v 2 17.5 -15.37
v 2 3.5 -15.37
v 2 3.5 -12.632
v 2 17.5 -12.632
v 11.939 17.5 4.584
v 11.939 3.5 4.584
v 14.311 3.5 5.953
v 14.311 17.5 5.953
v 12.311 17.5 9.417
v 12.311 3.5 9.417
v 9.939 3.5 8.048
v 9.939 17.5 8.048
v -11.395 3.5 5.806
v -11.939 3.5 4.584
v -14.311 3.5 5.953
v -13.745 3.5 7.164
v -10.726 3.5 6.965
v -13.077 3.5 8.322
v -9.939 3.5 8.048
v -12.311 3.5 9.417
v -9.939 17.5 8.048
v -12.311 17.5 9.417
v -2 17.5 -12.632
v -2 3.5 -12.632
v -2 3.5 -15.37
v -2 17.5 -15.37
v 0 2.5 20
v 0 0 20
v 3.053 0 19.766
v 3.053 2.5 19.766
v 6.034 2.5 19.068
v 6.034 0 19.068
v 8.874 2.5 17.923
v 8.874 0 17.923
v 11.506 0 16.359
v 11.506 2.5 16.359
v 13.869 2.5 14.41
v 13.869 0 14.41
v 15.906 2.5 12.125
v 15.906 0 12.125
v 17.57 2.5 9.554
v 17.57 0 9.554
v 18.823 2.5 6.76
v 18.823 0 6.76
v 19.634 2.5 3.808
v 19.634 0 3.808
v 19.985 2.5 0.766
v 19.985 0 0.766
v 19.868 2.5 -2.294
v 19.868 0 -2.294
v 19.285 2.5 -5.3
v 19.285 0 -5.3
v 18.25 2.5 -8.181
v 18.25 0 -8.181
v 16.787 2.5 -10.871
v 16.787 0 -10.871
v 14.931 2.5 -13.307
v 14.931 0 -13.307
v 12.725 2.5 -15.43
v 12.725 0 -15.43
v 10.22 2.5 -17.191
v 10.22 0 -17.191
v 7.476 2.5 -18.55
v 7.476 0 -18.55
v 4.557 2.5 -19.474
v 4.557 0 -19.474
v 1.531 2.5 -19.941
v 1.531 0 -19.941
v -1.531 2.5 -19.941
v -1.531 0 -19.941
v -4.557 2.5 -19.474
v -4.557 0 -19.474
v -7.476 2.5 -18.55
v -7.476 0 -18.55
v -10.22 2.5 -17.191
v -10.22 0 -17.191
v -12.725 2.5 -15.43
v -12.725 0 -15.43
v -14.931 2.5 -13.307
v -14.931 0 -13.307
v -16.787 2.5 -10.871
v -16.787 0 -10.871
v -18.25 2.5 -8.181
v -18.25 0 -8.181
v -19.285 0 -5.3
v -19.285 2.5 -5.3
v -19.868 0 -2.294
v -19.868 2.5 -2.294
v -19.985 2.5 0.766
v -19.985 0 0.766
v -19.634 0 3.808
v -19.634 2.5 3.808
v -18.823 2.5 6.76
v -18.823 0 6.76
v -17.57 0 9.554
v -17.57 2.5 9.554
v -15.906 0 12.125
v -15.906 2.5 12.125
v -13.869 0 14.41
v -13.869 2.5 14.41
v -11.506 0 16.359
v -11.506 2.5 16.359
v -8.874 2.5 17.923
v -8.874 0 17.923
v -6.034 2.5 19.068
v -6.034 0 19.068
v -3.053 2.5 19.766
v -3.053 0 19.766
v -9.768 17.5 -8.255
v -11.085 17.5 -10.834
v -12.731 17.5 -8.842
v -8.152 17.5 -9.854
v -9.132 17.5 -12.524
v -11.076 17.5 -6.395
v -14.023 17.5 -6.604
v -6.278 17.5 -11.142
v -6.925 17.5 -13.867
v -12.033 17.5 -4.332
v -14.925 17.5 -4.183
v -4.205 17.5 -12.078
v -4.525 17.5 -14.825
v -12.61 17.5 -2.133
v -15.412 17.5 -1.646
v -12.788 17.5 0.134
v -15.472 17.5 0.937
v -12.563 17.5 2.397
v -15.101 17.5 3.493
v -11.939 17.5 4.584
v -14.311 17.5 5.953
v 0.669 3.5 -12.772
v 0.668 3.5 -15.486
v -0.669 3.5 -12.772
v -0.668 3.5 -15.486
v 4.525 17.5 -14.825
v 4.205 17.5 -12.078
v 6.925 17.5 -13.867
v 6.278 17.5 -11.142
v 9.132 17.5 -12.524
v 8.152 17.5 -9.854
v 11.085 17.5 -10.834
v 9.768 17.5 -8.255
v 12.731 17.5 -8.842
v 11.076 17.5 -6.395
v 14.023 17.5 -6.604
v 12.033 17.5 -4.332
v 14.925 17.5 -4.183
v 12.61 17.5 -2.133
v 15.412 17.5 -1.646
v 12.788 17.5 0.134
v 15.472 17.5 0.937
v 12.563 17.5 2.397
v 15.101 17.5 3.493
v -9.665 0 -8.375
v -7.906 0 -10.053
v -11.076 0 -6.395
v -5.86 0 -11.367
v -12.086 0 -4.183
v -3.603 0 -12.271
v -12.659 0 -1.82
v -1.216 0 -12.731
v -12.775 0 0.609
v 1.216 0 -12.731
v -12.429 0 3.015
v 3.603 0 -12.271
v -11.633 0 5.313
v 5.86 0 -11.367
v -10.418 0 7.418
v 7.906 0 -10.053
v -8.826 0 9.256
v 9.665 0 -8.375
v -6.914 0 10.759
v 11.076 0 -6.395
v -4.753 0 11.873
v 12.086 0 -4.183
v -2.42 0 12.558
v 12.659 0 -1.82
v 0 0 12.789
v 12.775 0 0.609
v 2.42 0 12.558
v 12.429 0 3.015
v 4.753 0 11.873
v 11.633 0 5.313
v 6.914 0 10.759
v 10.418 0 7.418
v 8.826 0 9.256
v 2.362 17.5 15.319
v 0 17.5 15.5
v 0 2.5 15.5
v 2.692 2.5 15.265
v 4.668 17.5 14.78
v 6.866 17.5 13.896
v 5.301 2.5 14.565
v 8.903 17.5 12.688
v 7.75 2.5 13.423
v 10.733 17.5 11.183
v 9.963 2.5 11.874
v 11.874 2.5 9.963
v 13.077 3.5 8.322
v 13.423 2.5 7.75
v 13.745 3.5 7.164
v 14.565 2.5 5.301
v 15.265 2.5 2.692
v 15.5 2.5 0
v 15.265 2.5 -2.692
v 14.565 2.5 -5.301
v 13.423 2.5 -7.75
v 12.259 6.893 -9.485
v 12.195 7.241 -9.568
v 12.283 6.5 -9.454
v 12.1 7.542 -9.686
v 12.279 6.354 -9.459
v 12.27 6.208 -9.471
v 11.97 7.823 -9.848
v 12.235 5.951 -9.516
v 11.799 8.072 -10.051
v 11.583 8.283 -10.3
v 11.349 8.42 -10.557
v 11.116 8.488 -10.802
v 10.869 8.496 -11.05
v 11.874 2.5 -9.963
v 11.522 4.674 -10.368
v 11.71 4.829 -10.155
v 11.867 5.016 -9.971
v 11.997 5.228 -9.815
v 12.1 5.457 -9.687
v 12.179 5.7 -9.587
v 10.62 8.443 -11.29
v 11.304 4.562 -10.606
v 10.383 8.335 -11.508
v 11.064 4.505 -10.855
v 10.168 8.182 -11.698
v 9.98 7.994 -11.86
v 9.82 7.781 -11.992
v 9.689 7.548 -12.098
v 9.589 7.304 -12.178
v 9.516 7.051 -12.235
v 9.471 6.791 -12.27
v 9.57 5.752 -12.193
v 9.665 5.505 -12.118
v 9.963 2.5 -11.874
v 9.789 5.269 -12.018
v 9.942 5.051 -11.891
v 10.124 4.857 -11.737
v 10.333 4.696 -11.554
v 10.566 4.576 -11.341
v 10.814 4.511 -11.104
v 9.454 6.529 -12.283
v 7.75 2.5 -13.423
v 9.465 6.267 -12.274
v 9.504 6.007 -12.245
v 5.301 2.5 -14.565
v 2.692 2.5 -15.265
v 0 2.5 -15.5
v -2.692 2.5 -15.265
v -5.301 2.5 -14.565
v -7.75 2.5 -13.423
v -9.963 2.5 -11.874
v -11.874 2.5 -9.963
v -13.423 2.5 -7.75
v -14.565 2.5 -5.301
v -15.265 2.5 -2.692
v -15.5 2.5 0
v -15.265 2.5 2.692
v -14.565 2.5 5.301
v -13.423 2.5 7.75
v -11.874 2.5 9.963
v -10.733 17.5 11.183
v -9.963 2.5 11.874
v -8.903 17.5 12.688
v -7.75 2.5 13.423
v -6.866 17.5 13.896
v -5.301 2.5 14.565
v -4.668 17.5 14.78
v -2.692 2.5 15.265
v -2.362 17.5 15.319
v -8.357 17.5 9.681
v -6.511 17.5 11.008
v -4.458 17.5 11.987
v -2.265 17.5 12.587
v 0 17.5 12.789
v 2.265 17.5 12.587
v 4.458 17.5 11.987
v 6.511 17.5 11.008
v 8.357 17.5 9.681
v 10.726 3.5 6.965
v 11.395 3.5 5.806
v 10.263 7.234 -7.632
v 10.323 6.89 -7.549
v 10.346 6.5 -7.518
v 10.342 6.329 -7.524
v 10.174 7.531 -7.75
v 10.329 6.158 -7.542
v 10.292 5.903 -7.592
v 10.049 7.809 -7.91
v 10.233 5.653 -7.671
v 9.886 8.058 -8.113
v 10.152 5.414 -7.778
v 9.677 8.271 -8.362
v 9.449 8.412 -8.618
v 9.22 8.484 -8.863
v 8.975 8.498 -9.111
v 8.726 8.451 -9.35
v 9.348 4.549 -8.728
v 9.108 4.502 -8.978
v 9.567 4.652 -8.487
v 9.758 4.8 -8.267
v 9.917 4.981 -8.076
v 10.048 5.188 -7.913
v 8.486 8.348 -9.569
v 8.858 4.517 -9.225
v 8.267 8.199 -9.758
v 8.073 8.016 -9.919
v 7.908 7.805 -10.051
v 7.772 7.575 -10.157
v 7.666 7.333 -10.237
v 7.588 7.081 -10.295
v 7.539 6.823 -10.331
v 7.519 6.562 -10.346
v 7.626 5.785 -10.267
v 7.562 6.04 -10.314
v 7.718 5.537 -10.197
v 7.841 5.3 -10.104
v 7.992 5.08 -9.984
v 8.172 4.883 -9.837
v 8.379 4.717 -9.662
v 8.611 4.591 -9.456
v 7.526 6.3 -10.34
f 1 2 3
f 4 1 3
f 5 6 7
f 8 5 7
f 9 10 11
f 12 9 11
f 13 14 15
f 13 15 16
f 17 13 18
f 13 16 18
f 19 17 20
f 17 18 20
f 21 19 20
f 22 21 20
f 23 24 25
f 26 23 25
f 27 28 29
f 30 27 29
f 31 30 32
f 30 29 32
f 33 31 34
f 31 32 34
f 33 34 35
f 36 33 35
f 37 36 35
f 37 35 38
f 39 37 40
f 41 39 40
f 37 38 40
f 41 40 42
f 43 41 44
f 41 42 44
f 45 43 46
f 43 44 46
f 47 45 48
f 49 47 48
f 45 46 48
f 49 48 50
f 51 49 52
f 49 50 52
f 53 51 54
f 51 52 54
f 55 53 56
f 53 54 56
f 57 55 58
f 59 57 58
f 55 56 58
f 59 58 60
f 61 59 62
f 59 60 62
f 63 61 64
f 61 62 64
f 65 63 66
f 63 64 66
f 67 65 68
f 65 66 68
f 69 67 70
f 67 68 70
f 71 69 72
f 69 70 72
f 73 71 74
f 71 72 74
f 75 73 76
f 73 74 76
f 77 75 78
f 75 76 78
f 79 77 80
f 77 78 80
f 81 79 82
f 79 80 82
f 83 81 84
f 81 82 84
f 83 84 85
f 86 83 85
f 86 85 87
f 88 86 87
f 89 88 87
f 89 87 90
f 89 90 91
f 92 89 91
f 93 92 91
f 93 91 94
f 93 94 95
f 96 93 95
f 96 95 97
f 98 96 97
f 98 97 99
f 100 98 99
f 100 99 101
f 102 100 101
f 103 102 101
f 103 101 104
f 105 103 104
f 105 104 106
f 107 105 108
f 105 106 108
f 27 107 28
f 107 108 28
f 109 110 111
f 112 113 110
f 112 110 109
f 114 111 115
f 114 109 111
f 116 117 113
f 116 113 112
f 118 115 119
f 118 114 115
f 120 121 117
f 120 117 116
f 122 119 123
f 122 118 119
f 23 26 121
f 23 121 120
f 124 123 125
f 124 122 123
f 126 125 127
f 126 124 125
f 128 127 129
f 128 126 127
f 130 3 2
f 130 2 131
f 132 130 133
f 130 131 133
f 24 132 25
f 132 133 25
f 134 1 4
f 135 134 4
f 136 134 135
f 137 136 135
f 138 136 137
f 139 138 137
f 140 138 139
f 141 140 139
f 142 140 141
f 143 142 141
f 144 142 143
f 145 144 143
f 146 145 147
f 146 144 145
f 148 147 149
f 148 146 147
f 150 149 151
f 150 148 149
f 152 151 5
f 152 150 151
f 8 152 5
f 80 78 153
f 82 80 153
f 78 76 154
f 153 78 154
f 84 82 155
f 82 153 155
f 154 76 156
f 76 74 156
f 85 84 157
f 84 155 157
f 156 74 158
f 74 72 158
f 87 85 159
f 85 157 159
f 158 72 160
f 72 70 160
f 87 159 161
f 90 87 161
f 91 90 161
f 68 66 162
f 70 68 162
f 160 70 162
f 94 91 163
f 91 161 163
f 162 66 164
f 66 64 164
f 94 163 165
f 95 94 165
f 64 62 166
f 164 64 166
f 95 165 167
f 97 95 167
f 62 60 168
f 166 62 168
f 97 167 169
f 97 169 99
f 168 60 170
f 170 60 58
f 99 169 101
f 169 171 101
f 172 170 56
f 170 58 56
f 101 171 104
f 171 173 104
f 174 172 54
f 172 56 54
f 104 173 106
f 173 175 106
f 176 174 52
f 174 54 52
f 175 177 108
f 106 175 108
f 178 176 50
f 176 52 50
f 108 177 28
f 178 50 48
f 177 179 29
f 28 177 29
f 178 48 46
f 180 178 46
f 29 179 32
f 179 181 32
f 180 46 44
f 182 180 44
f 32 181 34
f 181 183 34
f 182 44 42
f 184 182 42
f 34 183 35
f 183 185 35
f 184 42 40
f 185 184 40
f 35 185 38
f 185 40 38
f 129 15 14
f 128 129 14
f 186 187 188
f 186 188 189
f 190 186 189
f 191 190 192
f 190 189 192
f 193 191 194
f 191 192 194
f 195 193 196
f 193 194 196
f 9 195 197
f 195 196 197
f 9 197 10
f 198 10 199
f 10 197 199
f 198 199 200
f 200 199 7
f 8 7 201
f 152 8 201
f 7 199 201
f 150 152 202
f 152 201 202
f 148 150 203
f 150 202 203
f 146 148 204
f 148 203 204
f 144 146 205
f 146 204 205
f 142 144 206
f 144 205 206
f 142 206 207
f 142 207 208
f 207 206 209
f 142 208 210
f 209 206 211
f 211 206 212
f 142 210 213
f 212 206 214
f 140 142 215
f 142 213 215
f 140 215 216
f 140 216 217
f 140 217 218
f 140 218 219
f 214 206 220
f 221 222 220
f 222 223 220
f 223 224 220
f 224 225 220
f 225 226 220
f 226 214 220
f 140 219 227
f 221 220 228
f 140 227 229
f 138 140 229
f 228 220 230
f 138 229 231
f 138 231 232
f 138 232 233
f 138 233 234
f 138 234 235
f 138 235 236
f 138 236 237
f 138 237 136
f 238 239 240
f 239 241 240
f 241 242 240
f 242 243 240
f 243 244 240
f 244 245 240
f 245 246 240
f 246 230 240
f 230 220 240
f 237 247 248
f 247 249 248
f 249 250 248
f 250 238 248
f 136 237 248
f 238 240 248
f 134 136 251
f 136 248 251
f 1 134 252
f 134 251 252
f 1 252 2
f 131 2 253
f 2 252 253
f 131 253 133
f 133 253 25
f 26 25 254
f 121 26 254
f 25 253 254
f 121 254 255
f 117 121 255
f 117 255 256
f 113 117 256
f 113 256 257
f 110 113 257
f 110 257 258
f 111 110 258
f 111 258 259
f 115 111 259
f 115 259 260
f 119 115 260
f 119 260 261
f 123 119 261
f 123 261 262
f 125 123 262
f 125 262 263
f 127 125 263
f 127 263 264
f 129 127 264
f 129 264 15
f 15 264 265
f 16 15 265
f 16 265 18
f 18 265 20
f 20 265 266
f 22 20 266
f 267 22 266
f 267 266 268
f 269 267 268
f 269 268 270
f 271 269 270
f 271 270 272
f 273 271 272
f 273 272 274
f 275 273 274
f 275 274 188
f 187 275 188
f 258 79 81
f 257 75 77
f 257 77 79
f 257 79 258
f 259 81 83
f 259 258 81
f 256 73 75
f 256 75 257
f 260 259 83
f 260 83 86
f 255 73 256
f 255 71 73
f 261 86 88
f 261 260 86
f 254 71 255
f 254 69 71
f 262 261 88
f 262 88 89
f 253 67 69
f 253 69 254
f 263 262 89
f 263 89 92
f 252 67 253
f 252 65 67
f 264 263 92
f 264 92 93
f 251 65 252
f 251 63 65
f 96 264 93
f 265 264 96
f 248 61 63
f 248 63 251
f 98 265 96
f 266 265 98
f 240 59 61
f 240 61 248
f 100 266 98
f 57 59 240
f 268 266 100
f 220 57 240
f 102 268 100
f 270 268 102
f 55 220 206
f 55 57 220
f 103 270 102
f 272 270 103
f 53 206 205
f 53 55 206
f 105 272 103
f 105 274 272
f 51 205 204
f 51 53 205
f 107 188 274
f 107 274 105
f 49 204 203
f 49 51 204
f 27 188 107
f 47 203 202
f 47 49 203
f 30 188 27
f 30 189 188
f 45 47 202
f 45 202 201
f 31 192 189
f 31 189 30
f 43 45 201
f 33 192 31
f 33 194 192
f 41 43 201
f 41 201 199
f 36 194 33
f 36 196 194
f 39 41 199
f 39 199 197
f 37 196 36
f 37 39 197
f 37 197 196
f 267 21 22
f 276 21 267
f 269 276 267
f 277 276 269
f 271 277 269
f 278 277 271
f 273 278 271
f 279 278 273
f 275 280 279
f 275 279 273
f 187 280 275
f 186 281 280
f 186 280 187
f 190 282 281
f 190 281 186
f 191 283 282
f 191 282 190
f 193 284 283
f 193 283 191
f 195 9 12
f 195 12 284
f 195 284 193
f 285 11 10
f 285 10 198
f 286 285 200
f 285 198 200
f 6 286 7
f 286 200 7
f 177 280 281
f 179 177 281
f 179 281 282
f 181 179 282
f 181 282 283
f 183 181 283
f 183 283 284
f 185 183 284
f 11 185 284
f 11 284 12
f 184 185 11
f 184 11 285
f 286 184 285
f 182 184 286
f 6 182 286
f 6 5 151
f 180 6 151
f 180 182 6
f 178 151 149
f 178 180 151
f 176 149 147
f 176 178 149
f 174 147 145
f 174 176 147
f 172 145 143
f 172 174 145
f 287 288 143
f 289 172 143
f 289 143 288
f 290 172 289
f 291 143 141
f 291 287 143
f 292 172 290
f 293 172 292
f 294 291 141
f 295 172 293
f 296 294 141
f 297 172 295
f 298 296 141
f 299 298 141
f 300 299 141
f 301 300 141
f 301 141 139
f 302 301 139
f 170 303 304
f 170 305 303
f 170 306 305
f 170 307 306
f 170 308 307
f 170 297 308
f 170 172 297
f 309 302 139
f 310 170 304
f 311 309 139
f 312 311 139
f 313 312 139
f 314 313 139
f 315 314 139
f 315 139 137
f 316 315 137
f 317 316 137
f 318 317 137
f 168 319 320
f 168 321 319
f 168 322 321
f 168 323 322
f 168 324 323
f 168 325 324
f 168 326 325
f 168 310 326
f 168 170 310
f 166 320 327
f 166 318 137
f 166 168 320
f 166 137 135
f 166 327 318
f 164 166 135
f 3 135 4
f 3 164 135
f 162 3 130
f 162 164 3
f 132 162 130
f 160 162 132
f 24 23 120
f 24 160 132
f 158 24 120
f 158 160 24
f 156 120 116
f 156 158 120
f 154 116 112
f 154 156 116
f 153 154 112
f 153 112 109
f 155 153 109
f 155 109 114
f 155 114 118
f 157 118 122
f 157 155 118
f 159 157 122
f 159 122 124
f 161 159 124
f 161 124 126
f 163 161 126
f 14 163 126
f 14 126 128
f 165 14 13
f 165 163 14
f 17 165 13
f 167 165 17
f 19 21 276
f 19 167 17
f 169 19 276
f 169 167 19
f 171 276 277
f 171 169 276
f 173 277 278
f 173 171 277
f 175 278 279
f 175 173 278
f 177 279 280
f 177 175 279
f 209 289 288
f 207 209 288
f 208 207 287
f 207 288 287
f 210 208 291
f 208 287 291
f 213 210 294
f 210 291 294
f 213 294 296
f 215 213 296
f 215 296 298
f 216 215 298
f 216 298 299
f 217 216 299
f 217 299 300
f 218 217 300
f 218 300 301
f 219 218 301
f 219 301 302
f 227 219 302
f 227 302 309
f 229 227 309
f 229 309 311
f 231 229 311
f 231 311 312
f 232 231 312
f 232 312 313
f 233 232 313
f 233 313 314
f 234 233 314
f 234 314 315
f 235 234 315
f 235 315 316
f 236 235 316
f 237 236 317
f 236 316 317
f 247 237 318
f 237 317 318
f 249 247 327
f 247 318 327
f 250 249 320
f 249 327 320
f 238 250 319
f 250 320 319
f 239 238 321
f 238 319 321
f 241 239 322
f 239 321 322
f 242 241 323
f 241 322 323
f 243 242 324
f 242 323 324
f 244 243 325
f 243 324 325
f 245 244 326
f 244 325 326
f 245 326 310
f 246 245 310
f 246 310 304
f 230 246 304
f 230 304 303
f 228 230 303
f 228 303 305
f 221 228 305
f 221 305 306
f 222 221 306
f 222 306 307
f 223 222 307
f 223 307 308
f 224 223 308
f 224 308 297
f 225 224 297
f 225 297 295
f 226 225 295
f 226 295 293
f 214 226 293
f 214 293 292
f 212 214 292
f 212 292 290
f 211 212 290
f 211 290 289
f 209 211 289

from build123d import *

# Parameters (mm, degrees)
CROQUIS1_R              = 20
CROQUIS1_R_2            = 12.789172095
SALIENTE_EXTRUIR1_DEPTH = 2.5
CROQUIS2_R              = 15.5
CROQUIS2_R_2            = 12.789172095
SALIENTE_EXTRUIR2_DEPTH = 15
CORTAR_EXTRUIR1_START   = -14
CORTAR_EXTRUIR1_DEPTH   = 14
MATRIZC1_COUNT          = 3
CROQUIS4_R              = 2
CORTAR_EXTRUIR2_DEPTH   = 17


with BuildPart() as part:
    # Croquis1 → Saliente-Extruir1 (new body)
    with BuildSketch(Plane(origin=(0, 0, 0), x_dir=(1, 0, 0), z_dir=(0, 1, 0))):
        with Locations(Location((0, 0, 0), (0, 0, 270))):
            Circle(CROQUIS1_R)
        with Locations(Location((0, 0, 0), (0, 0, 270))):
            Circle(CROQUIS1_R_2, mode=Mode.SUBTRACT)
    extrude(amount=SALIENTE_EXTRUIR1_DEPTH)

    # Croquis2 → Saliente-Extruir2 (add)
    with BuildSketch(Plane(origin=(0, 2.5, 0), x_dir=(1, 0, 0), z_dir=(0, 1, 0))):
        with Locations(Location((0, 0, 0), (0, 0, 270))):
            Circle(CROQUIS2_R)
        with Locations(Location((0, 0, 0), (0, 0, 270))):
            Circle(CROQUIS2_R_2, mode=Mode.SUBTRACT)
    extrude(amount=SALIENTE_EXTRUIR2_DEPTH)

    # Croquis3 → Cortar-Extruir1 (cut)
    with BuildSketch(Plane(origin=(0, 17.5, 0), x_dir=(1, 0, 0), z_dir=(0, 1, 0)).offset(CORTAR_EXTRUIR1_START)):
        with BuildLine():
            Line((2, 15.370426149), (2, 12.631821835))
            ThreePointArc((2, 12.631821835), (0, 12.789172095), (-2, 12.631821835))
            Line((-2, 12.631821835), (-2, 15.370426149))
            ThreePointArc((-2, 15.370426149), (0, 15.5), (2, 15.370426149))
        make_face()
    cortar_extruir1 = extrude(amount=CORTAR_EXTRUIR1_DEPTH, mode=Mode.SUBTRACT)

    # MatrizC1: Cortar-Extruir1 ×3 about axis
    matrizc1_axis = Axis((0, 0, 0), (0, 1, 0))
    for i in range(1, MATRIZC1_COUNT):
        add(cortar_extruir1.rotate(matrizc1_axis, i * 360 / MATRIZC1_COUNT), mode=Mode.SUBTRACT)

    # Croquis4 → Cortar-Extruir2 (cut)
    with BuildSketch(Plane(origin=(0, 0, 0), x_dir=(0.7071067811865477, 0, 0.7071067811865475), z_dir=(-0.7071067811865475, 0, 0.7071067811865477))):
        with Locations((0, 6.5)):
            Circle(CROQUIS4_R)
    extrude(amount=-CORTAR_EXTRUIR2_DEPTH, mode=Mode.SUBTRACT)


solid = part.part
